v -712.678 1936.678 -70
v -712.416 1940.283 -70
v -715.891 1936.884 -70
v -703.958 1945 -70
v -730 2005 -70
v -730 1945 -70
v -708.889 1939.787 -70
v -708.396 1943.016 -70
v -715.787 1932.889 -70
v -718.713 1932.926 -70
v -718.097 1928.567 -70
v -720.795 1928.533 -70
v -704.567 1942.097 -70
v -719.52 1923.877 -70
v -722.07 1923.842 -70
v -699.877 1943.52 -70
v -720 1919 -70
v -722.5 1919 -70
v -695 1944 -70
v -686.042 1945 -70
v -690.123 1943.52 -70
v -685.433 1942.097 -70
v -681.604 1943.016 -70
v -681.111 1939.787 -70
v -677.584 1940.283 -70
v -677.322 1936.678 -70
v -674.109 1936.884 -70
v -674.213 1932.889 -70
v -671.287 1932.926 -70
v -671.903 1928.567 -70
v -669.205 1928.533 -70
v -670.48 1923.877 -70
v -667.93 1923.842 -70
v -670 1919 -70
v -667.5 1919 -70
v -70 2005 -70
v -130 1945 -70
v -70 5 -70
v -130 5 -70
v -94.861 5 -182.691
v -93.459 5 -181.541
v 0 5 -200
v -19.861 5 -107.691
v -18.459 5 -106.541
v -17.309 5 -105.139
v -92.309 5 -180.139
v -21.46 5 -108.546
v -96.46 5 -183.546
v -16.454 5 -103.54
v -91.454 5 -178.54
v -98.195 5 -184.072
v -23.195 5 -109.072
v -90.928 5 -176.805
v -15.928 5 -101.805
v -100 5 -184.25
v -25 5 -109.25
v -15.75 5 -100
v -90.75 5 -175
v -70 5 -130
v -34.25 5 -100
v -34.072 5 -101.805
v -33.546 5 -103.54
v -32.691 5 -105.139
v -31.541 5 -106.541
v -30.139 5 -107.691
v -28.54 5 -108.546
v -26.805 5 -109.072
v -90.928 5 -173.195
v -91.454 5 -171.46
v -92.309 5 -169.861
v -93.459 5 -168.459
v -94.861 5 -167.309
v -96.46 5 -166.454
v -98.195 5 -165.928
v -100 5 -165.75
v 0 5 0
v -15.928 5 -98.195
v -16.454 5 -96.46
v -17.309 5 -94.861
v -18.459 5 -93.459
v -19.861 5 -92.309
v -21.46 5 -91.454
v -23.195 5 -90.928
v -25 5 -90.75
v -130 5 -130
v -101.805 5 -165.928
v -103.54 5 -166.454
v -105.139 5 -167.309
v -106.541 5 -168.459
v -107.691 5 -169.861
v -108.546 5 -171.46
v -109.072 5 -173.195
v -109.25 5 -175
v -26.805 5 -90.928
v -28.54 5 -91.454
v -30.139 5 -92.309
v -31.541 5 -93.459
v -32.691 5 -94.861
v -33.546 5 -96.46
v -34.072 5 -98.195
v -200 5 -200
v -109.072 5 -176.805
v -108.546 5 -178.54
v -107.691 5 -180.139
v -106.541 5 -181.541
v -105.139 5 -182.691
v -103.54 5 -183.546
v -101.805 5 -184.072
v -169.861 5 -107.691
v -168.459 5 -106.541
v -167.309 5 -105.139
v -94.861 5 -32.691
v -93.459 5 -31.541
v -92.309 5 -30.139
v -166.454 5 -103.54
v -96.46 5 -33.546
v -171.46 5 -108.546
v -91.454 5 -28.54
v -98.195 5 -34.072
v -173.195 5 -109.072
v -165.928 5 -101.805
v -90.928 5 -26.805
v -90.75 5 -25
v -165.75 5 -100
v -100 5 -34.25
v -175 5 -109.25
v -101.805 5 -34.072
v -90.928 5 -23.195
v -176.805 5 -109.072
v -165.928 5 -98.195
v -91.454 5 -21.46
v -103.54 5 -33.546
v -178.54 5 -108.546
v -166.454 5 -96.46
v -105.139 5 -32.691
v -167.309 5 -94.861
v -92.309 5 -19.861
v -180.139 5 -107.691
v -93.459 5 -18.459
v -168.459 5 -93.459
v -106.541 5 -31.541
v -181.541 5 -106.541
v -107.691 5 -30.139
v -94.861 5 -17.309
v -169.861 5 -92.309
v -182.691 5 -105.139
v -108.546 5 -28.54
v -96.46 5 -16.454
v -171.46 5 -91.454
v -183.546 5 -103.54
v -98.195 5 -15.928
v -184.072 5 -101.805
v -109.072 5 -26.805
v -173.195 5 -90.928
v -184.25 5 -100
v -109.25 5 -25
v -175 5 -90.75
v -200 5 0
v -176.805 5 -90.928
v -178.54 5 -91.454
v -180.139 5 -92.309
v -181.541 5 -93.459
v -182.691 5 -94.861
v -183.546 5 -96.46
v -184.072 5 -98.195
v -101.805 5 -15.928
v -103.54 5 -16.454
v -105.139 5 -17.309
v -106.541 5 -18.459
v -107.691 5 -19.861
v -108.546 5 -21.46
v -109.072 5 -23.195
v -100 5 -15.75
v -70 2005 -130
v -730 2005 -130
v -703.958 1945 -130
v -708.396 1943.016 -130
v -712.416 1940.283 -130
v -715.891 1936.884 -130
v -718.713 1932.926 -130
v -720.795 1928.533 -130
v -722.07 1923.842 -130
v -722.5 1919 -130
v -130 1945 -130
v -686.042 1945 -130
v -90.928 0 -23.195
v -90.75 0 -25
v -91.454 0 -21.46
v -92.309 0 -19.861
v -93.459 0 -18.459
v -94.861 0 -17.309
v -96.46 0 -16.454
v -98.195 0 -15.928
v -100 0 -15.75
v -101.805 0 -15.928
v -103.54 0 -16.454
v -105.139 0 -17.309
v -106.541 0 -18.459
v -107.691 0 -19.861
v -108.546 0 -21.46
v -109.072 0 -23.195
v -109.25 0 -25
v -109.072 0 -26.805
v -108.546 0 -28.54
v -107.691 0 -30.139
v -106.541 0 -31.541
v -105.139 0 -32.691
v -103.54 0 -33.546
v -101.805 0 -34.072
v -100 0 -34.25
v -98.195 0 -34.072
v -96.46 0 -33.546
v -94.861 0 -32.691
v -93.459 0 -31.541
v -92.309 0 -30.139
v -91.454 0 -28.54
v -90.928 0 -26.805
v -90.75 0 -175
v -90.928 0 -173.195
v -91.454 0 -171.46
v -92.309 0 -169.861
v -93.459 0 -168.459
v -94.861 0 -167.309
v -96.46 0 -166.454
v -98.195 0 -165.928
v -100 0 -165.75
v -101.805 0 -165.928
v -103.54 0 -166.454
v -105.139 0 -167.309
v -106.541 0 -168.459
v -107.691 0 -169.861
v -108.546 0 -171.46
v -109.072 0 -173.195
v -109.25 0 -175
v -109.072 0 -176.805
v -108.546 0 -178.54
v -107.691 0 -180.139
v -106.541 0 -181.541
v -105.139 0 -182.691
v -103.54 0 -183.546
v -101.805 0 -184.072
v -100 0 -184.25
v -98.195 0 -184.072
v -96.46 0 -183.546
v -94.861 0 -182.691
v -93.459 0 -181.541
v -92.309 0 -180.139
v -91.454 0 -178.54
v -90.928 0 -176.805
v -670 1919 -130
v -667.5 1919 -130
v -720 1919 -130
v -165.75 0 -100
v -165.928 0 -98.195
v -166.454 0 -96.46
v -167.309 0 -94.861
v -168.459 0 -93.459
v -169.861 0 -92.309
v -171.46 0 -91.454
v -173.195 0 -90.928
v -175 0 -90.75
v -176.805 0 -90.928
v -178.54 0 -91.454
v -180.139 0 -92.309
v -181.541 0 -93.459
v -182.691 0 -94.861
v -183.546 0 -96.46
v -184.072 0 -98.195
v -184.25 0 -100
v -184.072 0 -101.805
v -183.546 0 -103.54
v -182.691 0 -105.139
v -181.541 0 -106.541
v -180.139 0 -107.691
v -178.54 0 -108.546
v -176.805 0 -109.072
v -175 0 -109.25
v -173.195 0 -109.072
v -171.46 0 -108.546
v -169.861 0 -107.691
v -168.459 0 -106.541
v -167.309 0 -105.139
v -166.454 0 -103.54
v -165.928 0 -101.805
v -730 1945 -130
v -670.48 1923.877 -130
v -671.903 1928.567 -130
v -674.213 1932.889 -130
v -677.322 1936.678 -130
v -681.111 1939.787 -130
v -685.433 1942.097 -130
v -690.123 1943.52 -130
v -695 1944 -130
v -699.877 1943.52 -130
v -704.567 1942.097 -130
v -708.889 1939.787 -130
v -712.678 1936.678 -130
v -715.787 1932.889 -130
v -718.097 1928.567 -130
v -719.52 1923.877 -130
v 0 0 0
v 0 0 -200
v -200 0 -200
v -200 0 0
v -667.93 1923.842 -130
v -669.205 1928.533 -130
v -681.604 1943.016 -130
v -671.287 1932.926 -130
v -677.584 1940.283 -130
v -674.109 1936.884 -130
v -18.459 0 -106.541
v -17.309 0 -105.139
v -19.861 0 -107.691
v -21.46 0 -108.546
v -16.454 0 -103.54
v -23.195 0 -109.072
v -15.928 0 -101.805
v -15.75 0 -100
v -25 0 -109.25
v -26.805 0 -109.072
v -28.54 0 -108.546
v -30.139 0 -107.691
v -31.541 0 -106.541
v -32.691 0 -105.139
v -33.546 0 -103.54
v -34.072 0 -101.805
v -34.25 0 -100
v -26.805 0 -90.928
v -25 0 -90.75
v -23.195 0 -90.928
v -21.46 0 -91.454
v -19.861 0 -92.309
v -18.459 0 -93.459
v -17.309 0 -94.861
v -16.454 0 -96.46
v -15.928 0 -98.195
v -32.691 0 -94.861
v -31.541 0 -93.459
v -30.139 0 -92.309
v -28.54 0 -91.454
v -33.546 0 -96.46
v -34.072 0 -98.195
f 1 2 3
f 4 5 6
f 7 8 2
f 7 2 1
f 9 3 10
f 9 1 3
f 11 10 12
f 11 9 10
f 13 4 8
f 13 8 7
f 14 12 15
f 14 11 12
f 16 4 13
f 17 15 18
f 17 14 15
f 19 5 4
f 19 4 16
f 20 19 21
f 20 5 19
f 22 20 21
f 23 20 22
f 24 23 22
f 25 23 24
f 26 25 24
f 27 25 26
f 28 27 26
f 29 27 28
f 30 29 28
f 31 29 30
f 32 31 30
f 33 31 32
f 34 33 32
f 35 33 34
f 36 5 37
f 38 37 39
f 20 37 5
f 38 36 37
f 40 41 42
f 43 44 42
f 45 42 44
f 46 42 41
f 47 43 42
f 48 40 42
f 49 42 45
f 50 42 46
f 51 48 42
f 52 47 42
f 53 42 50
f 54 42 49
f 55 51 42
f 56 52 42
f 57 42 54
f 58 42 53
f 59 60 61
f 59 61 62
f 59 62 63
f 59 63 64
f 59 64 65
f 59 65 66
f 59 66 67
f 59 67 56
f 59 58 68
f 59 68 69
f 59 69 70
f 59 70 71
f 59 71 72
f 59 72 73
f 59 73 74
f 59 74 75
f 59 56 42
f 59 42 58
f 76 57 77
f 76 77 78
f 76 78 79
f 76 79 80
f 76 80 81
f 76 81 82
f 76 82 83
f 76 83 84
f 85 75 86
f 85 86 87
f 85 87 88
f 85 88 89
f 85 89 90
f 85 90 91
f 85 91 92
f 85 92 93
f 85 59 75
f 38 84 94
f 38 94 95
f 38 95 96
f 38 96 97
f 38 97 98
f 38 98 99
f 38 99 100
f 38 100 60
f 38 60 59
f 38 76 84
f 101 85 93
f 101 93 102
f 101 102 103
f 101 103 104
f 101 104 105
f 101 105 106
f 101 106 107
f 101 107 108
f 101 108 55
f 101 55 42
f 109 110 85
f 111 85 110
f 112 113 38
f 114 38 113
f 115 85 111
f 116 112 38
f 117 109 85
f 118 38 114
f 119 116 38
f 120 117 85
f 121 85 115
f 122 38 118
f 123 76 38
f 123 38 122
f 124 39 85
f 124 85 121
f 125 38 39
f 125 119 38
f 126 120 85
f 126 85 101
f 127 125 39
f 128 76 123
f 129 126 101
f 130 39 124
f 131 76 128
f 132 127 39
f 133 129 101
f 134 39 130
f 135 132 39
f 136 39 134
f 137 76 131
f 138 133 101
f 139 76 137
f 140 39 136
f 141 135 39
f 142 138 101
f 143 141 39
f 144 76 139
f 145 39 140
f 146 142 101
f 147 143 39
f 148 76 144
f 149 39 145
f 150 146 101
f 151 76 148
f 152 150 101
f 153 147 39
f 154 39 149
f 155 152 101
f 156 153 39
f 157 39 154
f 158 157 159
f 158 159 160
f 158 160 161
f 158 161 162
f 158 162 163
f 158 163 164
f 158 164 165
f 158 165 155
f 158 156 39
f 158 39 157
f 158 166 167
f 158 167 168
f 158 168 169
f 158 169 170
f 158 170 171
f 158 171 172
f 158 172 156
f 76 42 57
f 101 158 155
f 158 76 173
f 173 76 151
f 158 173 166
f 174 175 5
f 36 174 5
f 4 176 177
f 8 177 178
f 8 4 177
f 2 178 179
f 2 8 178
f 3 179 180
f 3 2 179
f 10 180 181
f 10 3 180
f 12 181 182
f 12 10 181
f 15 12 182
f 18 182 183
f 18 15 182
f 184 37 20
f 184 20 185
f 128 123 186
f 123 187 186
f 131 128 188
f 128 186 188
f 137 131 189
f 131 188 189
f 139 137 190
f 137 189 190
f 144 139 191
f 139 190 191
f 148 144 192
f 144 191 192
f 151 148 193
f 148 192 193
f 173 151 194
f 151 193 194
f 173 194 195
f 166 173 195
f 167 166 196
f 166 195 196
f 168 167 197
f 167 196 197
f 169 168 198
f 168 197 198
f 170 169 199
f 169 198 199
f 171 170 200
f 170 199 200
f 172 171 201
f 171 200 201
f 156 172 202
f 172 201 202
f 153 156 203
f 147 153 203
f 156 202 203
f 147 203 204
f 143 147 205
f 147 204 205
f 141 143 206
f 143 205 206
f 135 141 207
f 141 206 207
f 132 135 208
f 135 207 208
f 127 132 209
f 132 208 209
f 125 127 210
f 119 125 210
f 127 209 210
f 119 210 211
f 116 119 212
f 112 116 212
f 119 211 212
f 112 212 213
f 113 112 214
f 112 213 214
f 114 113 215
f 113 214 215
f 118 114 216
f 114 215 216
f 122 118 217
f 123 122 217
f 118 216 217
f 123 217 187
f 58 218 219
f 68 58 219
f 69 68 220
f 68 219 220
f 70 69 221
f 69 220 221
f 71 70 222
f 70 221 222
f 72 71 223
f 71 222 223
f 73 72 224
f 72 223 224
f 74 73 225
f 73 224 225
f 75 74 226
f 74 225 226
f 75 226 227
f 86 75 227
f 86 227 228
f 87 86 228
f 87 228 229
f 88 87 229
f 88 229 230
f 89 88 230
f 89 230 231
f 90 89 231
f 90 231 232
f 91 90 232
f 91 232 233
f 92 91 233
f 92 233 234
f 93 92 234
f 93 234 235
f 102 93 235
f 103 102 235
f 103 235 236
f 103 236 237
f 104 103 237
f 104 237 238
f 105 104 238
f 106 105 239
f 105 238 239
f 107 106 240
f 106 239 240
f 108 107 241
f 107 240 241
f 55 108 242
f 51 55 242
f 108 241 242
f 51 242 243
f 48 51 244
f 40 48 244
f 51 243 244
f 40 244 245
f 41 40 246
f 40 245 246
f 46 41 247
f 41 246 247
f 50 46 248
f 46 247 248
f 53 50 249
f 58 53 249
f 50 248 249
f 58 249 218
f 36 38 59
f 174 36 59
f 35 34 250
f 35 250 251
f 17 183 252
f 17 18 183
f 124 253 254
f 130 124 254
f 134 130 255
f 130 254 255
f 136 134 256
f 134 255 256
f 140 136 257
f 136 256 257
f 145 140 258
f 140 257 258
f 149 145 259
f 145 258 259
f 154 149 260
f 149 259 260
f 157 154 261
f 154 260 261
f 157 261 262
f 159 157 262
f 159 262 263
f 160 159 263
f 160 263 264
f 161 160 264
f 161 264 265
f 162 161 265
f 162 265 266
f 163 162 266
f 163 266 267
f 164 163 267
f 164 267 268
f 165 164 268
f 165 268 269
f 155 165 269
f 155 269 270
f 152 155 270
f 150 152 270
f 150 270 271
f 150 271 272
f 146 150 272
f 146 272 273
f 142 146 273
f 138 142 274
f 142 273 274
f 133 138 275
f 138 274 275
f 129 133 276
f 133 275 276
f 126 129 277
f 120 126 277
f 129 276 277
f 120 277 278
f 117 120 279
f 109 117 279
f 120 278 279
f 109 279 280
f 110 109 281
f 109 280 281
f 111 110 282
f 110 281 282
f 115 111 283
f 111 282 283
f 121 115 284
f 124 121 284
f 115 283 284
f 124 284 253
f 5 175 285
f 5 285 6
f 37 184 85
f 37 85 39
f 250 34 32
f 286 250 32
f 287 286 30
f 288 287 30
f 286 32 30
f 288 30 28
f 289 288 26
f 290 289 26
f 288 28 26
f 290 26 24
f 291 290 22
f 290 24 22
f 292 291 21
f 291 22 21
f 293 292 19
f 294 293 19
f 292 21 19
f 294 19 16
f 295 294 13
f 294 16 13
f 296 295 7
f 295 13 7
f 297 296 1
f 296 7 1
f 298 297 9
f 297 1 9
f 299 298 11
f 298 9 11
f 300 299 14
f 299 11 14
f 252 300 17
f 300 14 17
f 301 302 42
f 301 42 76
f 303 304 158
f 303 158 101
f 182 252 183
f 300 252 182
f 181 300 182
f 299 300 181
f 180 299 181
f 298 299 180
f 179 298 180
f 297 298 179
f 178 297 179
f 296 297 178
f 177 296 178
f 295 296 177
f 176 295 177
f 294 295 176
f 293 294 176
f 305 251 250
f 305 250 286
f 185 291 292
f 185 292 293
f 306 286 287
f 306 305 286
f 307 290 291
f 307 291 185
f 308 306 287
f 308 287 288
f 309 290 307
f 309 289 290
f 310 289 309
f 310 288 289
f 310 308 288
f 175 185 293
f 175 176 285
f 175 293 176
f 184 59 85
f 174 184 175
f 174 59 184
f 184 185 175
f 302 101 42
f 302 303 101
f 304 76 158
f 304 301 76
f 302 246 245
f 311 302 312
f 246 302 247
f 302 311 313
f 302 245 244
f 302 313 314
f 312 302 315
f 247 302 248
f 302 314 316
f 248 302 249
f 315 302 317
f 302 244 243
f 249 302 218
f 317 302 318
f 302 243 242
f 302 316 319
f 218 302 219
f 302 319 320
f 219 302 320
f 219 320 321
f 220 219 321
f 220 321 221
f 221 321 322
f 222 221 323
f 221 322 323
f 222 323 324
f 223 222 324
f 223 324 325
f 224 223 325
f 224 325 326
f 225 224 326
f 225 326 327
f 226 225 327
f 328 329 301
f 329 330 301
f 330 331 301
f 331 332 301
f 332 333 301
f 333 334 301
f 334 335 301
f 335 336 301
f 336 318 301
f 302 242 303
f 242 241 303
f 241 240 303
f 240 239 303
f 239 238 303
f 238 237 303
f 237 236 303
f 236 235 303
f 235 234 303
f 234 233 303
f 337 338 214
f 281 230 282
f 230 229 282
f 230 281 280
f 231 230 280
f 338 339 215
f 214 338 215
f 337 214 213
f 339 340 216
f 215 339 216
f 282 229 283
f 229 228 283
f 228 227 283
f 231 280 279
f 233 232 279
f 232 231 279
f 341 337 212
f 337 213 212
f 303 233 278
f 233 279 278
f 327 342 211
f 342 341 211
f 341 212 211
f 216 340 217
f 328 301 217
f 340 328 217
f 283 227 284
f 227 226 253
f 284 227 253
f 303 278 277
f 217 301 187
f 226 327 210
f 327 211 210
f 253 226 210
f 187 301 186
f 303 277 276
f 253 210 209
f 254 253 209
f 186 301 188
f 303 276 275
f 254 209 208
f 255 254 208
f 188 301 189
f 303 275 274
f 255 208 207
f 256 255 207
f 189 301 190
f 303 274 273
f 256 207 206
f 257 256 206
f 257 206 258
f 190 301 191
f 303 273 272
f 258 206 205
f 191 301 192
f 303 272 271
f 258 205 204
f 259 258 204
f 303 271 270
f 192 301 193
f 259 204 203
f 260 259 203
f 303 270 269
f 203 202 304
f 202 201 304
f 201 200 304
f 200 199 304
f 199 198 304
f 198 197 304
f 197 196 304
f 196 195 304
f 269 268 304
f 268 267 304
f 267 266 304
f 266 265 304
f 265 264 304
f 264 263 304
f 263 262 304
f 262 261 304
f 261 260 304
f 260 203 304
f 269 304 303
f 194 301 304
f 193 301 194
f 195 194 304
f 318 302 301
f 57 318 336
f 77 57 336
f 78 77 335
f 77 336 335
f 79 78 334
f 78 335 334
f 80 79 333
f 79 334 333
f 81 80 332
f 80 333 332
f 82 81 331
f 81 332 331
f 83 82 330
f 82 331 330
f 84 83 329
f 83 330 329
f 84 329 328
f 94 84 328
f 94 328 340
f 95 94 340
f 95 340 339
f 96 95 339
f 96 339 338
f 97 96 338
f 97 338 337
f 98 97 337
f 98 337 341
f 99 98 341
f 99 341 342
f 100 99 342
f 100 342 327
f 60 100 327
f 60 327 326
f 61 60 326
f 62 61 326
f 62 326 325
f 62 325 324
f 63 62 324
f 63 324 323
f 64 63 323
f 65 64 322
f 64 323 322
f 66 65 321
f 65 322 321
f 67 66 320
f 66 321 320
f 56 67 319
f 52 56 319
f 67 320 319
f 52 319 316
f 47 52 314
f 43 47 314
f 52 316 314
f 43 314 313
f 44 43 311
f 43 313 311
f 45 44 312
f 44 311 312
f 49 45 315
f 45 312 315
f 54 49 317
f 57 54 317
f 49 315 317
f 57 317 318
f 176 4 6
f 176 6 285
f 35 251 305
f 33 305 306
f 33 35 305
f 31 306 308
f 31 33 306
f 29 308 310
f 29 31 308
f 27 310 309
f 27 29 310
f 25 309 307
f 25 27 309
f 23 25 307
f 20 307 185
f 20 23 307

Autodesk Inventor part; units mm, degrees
ref_plane "YZ Plane" through (0, 0, 0) normal (1, 0, 0) x (0, 1, 0)
ref_plane "XZ Plane" through (0, 0, 0) normal (0, 1, 0) x (-1, 0, 0)
ref_plane "XY Plane" through (0, 0, 0) normal (0, 0, 1) x (1, 0, 0)
sketch "Boceto1" plane through (0, 0, 0) normal (0, 1, 0) x (-1, 0, 0)
  line L0 (0, 0) -> (200, 0)
  line L1 (200, 0) -> (200, -200)
  line L2 (200, -200) -> (0, -200)
  line L3 (0, -200) -> (0, 0)
  dimension "d0" = 200
  dimension "d1" = 200
extrude "Extrusión1" add sketch "Boceto1" along normal blind 5
sketch "Boceto2" plane through (0, 5, 0) normal (0, 1, 0) x (1, 0, 0)
  line L0 (-130, 70) -> (-70, 70)
  line L1 (-70, 70) -> (-70, 130)
  line L2 (-70, 130) -> (-130, 130)
  line L3 (-130, 130) -> (-130, 70)
  line L4 (-200, 200) -> (-200, 0) projected
  line L5 (-200, 0) -> (0, 0) projected
  point P0 (-130, 100)
  dimension "d4" = 60
  dimension "d5" = 60
  dimension "d6" = 70
  dimension "d7" = 70
extrude "Extrusión2" add sketch "Boceto2" along normal blind 2000
sketch "Boceto3" plane through (-130, 5, -130) normal (-1, 0, 0) x (0, 0, 1)
  line L0 (0, 0) -> (0, 2000) projected
  line L1 (0, 2000) -> (60, 2000)
  line L2 (60, 2000) -> (60, 1940)
  line L3 (60, 1940) -> (0, 1940)
  line L4 (0, 1940) -> (0, 2000)
  point P0 (130, -5)
  dimension "d10" = 60
  dimension "d11" = 60
extrude "Extrusión3" add sketch "Boceto3" along normal blind 600
sketch "Boceto4" plane through (-130, 5, -70) normal (0, 0, 1) x (1, 0, 0)
  arc A0 (-540, 1914) -> (-590, 1914) centre (-565, 1914) ccw
  line L0 (-600, 1940) -> (-600, 2000) projected
  line L1 (0, 1940) -> (-600, 1940) projected
  arc A1 (-537.5, 1914) -> (-592.5, 1914) centre (-565, 1914) ccw
  line L2 (-592.5, 1914) -> (-590, 1914)
  line L3 (-540, 1914) -> (-537.5, 1914)
  point P0 (130, -5)
  dimension "d14" = 50
  dimension "d15" = 35
  dimension "d16" = 26
  dimension "d17" = 55
extrude "Extrusión4" add sketch "Boceto4" against normal blind 60
sketch "Boceto5" plane through (0, 0, 0) normal (0, -1, 0) x (1, 0, 0)
  line L0 (0, 0) -> (0, -200) projected
  line L1 (0, -100) -> (-200, -100)
  line L2 (-200, -200) -> (-200, 0) projected
  line L3 (0, -200) -> (-200, -200) projected
  line L4 (-100, -200) -> (-100, 0)
  line L5 (-200, 0) -> (0, 0) projected
  circle A0 centre (-100, -175) radius 9.25
  circle A1 centre (-175, -100) radius 9.25
  circle A2 centre (-100, -25) radius 9.25
  circle A3 centre (-25, -100) radius 9.25
  point P0 (-100, -100)
  point P1 (-100, -100)
  point P2 (-100, -100)
  point P3 (-100, -100)
  dimension "d20" = 18.5
  dimension "d21" = 75
  dimension "d24" = 360
extrude "Extrusión5" cut sketch "Boceto5" against normal blind 10 contours A3 L1 | L1 A3 | A2 L4 | L4 A2 | A0 L4 | L4 A0 | A1 L1 | L1 A1
properties part number "Sriel"
